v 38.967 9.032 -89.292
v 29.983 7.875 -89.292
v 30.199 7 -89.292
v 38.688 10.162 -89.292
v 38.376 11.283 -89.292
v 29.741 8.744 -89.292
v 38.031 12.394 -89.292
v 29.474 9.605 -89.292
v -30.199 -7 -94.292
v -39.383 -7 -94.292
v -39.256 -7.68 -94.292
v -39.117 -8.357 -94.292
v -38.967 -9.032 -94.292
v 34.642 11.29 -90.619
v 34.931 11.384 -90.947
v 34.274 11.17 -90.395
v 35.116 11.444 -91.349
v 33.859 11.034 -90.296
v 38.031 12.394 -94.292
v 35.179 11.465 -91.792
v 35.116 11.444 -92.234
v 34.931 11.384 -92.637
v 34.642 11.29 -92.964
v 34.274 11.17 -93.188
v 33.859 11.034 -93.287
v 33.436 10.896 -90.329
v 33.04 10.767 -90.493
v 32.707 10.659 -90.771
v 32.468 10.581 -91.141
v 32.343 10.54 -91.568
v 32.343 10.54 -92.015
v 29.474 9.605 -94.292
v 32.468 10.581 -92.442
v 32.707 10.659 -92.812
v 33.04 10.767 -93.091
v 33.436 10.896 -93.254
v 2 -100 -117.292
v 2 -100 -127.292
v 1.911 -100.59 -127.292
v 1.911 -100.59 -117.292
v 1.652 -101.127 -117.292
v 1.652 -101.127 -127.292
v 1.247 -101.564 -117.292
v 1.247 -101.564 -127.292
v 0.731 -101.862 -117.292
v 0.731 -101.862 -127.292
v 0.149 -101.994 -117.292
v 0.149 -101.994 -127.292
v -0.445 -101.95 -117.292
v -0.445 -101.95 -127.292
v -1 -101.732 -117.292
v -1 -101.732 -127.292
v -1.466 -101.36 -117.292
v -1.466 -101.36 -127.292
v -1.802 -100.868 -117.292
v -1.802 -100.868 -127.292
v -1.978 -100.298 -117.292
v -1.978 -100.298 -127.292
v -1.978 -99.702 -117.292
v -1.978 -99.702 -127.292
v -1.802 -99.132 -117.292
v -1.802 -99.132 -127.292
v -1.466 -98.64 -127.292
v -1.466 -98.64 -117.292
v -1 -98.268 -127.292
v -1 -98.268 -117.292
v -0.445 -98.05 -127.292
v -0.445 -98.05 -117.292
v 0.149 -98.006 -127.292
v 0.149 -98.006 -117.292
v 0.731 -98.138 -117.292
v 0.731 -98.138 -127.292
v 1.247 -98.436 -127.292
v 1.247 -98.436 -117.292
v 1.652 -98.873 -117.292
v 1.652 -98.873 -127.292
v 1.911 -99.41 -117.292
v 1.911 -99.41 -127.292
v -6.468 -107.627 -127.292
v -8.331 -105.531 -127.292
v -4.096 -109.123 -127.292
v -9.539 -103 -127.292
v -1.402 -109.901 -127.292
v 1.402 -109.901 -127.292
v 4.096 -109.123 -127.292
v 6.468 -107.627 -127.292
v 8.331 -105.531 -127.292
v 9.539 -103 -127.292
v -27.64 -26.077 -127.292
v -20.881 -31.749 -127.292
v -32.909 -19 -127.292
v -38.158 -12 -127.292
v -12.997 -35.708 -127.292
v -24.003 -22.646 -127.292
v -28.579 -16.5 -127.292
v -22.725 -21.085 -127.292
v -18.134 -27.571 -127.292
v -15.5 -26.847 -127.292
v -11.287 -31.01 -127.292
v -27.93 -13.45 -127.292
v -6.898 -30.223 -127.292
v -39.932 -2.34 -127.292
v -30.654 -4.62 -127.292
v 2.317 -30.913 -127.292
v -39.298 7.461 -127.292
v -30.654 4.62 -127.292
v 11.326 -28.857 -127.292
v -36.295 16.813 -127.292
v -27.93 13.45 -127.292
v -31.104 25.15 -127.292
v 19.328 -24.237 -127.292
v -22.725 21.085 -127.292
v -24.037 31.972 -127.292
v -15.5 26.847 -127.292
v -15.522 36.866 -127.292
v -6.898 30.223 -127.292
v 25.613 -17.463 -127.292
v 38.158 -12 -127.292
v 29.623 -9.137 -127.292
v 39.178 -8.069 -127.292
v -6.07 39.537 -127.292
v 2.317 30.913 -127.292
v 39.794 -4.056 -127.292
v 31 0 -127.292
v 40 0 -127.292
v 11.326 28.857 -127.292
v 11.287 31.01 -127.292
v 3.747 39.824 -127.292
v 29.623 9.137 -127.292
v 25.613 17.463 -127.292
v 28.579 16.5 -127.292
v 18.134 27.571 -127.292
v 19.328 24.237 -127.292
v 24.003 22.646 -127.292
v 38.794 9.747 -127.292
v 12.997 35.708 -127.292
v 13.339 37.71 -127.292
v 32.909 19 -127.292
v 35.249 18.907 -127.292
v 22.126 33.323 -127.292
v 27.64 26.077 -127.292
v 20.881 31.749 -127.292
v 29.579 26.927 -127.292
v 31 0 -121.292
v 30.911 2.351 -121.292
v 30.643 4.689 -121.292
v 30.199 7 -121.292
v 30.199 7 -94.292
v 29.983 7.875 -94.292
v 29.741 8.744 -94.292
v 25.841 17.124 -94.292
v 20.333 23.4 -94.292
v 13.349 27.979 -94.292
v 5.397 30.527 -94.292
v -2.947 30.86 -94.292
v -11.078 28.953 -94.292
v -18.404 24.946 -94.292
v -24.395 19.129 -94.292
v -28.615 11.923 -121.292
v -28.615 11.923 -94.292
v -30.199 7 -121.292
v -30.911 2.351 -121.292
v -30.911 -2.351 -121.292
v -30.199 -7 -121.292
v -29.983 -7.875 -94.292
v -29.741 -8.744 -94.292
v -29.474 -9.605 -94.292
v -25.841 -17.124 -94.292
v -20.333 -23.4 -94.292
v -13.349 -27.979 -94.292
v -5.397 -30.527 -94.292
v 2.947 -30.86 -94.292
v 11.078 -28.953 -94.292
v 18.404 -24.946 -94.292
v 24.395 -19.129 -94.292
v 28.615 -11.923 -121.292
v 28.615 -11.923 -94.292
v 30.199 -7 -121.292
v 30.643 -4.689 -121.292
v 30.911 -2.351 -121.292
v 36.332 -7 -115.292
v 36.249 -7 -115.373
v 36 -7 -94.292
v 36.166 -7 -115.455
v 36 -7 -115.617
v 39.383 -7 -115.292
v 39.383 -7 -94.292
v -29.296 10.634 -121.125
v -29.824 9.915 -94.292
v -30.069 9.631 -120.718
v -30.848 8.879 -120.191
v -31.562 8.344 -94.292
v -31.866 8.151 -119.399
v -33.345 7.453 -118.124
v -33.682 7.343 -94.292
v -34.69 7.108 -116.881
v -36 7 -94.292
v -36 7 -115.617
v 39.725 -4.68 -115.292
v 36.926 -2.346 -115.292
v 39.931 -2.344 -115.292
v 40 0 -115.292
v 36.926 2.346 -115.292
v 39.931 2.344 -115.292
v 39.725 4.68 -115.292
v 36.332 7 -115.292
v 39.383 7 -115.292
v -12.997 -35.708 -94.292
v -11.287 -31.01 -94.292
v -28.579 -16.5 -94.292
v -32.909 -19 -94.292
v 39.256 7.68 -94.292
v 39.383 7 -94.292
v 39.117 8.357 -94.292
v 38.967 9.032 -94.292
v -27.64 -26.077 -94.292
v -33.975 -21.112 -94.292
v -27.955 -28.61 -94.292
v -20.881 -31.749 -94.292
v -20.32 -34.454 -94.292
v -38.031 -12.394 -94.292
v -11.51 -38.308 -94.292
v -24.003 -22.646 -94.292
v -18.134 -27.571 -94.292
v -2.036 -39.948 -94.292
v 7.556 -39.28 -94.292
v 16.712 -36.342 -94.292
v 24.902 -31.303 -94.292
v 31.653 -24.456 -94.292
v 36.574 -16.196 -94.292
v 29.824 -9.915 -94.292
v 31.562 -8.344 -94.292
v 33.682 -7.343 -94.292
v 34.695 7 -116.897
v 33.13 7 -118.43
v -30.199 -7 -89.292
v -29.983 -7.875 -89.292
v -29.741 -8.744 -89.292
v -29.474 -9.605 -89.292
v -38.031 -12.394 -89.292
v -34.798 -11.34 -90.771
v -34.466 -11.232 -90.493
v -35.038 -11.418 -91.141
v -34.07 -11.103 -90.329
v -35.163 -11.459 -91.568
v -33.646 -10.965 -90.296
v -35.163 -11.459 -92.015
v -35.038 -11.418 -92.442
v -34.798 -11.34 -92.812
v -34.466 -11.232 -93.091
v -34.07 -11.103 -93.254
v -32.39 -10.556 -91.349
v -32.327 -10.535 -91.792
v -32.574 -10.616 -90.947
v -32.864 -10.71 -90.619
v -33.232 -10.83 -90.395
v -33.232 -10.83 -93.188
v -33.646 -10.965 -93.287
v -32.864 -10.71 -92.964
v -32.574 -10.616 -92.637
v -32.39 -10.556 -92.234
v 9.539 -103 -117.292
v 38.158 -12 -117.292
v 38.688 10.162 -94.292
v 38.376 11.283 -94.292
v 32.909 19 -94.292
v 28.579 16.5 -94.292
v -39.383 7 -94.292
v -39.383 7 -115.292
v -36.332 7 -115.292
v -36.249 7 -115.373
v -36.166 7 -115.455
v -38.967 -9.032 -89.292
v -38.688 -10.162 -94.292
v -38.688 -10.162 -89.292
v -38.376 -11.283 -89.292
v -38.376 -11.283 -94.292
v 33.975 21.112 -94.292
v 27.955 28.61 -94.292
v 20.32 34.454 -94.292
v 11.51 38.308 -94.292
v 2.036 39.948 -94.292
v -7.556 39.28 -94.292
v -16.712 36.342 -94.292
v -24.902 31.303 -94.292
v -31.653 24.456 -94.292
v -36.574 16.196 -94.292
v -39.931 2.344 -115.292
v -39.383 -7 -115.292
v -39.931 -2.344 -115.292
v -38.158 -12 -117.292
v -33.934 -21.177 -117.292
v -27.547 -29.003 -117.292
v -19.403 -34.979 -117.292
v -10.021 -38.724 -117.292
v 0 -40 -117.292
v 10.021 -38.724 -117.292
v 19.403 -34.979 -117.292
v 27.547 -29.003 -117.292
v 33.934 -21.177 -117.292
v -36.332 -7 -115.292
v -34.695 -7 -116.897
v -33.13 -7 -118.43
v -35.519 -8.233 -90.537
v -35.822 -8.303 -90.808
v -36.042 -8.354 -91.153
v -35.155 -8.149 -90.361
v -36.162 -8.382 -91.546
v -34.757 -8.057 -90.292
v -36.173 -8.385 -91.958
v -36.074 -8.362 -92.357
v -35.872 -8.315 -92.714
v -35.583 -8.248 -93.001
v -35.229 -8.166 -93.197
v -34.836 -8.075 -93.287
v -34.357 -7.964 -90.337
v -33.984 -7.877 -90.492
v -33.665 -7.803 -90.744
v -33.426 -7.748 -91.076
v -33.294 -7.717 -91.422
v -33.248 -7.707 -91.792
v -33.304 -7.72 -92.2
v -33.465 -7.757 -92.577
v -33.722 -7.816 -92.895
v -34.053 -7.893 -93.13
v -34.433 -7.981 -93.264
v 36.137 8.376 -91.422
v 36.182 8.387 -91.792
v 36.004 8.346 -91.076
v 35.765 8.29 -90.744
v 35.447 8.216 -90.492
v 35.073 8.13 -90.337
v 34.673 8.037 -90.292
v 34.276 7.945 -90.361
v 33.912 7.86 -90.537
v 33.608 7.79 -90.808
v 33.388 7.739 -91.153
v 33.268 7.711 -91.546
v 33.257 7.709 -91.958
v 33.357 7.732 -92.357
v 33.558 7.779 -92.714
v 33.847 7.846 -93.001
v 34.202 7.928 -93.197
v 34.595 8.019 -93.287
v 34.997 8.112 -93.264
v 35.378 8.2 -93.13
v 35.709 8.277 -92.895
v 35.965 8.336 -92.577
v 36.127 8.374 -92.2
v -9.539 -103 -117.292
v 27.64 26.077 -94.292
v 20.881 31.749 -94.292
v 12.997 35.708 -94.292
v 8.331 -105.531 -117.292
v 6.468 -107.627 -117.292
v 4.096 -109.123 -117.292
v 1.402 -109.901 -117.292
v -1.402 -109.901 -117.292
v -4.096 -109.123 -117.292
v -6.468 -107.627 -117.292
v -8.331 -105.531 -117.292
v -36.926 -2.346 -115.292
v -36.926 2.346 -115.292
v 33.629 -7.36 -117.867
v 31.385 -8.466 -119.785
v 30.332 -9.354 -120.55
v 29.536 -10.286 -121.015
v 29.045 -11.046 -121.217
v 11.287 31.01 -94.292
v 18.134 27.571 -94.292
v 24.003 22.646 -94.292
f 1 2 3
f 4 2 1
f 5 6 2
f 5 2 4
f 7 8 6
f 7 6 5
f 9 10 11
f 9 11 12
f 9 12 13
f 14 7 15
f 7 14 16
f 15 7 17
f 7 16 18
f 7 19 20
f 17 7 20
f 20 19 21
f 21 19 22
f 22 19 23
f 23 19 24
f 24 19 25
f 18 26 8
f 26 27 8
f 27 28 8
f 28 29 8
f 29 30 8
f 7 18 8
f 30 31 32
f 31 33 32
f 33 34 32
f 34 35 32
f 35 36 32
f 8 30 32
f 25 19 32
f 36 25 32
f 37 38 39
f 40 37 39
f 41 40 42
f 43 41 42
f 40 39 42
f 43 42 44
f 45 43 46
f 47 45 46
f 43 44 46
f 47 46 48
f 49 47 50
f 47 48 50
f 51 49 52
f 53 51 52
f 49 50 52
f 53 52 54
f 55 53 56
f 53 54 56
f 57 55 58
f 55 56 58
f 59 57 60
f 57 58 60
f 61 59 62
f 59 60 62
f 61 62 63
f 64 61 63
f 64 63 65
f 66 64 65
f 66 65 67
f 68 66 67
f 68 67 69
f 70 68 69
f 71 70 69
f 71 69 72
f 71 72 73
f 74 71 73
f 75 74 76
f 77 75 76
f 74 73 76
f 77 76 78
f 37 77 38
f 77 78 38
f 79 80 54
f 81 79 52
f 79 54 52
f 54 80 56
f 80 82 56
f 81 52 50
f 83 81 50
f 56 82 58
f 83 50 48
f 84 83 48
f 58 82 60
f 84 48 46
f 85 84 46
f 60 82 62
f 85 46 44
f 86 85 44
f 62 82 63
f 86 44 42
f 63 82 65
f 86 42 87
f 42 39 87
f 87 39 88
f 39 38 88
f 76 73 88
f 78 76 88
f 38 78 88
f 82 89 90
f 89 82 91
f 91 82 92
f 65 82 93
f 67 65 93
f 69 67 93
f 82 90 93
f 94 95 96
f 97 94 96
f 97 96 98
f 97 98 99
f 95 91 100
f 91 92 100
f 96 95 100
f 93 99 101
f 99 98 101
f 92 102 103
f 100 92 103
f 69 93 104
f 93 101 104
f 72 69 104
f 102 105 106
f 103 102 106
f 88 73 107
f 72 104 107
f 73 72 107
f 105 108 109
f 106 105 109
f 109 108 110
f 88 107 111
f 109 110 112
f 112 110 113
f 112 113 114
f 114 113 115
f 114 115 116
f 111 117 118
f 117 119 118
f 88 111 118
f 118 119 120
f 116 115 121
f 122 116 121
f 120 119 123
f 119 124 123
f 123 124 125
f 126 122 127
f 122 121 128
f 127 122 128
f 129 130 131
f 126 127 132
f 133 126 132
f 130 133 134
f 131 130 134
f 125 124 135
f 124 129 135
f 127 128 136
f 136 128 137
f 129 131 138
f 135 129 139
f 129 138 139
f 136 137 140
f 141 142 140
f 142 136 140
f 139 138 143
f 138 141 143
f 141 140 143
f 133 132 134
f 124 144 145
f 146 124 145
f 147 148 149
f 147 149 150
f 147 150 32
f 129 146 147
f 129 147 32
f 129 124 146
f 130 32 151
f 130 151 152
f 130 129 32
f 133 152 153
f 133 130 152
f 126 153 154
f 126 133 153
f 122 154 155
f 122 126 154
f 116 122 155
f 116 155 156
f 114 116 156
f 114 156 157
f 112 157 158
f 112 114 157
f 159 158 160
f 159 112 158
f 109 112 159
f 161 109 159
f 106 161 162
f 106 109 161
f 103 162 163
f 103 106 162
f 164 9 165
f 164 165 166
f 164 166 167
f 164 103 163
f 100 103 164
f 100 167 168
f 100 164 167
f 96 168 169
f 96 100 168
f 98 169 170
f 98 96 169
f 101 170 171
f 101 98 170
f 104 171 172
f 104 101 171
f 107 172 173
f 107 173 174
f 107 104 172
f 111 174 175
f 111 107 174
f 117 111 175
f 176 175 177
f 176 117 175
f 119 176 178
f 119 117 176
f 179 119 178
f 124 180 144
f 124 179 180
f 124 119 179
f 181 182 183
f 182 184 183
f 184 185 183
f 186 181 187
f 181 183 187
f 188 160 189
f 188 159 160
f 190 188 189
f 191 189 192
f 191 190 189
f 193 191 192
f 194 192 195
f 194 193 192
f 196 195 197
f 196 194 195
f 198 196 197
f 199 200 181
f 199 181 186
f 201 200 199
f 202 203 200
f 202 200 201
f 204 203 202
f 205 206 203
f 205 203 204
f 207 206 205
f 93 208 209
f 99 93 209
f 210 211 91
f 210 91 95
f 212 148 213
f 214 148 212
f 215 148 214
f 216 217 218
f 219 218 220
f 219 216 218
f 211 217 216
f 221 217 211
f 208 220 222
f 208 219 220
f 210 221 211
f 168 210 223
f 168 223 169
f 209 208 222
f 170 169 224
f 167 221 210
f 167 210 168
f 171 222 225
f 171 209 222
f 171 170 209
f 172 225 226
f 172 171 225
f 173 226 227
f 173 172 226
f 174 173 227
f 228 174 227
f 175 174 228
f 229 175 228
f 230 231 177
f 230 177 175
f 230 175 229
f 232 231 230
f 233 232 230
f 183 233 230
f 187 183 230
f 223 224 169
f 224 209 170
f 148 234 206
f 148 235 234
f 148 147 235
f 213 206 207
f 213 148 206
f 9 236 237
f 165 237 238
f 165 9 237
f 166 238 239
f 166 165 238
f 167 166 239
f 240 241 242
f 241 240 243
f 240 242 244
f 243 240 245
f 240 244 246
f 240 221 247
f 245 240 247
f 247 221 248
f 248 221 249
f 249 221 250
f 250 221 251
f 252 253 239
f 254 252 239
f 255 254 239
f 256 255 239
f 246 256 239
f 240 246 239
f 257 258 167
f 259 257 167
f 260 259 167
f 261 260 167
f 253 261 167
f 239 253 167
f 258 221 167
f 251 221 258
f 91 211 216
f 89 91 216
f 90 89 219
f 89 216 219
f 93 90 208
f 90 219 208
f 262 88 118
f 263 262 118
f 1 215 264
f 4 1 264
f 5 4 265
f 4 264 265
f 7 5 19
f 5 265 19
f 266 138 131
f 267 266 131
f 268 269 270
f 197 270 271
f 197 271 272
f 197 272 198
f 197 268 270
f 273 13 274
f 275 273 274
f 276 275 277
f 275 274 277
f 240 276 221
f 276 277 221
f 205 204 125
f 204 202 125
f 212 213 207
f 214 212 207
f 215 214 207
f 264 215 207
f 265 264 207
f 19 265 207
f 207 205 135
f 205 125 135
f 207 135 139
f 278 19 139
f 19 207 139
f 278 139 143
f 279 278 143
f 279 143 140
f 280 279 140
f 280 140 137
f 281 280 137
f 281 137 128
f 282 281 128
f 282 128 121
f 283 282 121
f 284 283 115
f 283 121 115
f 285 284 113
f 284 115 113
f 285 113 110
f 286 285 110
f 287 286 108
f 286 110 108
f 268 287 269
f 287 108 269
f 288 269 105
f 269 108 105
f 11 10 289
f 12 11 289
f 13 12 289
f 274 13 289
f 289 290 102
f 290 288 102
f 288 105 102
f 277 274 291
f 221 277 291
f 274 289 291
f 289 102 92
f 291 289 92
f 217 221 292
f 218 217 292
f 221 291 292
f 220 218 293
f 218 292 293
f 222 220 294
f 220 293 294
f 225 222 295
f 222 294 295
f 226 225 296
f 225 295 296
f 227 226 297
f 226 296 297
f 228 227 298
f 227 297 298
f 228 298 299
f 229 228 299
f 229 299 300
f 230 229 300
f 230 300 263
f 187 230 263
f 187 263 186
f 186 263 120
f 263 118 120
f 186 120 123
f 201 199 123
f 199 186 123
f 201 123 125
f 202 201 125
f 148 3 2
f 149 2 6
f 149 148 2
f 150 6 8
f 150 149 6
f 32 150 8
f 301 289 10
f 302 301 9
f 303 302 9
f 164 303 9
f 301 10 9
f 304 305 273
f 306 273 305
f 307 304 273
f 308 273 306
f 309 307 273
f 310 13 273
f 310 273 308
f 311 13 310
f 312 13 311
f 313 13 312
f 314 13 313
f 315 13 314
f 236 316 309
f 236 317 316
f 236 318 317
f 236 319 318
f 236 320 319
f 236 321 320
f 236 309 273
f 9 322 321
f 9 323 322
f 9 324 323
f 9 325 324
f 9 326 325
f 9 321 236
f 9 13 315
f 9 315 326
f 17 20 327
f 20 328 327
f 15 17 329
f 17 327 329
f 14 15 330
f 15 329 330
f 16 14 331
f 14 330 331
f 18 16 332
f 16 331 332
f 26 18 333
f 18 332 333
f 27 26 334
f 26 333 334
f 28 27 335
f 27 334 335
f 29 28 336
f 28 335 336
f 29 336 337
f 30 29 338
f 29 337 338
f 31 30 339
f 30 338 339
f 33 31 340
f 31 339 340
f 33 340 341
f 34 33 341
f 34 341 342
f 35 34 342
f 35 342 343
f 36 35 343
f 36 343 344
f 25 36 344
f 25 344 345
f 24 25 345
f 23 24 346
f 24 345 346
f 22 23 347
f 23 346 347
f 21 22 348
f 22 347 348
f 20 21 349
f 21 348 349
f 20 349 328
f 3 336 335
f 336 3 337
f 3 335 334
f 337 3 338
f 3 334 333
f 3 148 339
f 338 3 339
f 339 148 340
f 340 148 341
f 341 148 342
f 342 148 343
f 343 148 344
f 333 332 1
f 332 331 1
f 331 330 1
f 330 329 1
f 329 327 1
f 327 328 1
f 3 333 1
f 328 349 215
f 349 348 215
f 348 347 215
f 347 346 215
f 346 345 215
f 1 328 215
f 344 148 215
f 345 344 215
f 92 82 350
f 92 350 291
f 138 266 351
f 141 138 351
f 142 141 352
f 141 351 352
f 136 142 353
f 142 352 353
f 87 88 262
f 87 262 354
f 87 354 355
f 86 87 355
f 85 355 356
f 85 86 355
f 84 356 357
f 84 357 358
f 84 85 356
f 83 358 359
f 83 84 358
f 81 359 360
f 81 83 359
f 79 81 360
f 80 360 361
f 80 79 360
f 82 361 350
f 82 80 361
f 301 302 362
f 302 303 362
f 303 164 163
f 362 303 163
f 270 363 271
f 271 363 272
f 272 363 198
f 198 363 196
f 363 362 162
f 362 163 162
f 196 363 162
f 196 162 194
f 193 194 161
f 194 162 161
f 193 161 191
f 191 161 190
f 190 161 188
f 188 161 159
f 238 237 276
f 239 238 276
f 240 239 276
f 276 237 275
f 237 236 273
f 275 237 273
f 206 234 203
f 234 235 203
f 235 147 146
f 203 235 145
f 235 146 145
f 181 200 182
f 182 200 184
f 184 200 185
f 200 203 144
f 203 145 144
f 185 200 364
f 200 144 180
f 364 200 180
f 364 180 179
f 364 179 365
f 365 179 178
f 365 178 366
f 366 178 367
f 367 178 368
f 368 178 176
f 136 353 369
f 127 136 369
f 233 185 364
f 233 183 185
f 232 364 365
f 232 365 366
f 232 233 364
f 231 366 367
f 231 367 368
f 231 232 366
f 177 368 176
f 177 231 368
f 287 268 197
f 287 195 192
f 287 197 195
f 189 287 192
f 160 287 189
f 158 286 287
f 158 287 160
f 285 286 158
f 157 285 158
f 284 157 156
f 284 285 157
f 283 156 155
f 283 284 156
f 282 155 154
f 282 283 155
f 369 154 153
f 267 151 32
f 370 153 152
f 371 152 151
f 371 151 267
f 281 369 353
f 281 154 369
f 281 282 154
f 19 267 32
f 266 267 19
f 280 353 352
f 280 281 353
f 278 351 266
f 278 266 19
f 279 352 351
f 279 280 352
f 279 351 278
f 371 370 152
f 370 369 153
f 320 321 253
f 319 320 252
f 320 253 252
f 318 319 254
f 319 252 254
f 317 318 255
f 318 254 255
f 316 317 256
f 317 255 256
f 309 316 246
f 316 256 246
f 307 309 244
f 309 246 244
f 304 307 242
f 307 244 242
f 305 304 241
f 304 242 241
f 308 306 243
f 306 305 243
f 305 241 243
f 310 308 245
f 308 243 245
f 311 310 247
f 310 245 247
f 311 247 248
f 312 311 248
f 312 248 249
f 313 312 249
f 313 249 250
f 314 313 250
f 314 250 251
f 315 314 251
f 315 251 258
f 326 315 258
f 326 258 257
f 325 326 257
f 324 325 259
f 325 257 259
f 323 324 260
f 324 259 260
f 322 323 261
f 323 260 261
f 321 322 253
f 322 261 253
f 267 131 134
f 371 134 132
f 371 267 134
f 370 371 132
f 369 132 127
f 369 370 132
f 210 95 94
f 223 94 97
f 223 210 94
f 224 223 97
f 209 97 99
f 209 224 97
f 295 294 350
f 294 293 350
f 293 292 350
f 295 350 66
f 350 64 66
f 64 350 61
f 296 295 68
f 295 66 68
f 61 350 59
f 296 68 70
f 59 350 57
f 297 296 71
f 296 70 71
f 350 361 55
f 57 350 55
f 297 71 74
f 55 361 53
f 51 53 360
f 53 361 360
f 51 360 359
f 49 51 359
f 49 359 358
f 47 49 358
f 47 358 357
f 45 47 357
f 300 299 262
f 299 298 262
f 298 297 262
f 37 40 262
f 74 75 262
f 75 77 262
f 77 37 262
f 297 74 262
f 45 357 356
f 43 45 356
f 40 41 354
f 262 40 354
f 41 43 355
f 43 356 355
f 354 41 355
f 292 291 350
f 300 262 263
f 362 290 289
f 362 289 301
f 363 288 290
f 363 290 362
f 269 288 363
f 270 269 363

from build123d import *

# Parameters (mm, degrees)
SKETCH022_R        = 40
SKETCH022_R_2      = 31
PAD006_DEPTH       = 33
SKETCH023_W        = 90
SKETCH023_H        = 14
POCKET010_DEPTH    = 21
CHAMFER_SIZE       = 6
POCKET011_DEPTH    = 268.7042032027
POLARPATTERN_COUNT = 2
FILLET001_R        = 8
PAD008_DEPTH       = 5
SKETCH028_R        = 1.5
POCKET013_DEPTH    = 3.5
SKETCH029_R        = 2
PAD009_DEPTH       = 10


with BuildPart() as part:
    # Sketch022 (on DatumPlane) → Pad006 (new body)
    with BuildSketch(Plane.XY.offset(-127.29162)):
        Circle(SKETCH022_R)
        Circle(SKETCH022_R_2, mode=Mode.SUBTRACT)
    extrude(amount=PAD006_DEPTH)

    # Sketch023 (on Face4 of Pad006) → Pocket010 (cut)
    with BuildSketch(Plane.XY.offset(-94.29162)):
        Rectangle(SKETCH023_W, SKETCH023_H)
    extrude(amount=-POCKET010_DEPTH, mode=Mode.SUBTRACT)

    # Chamfer
    chamfer_edges = [part.edges().sort_by_distance(p)[0] for p in [
        (-31, 0, -115.29162),
        (30.799184, -3.522821, -115.29162),
    ]]
    chamfer(chamfer_edges, length=CHAMFER_SIZE)

    # Sketch024 (on Face8 of Chamfer) → Pocket011 (cut, through all)
    with BuildSketch(Plane.XY.offset(-94.29162)):
        with BuildLine():
            ThreePointArc((-32.9089653438, -19), (-24.4259291681, -29.1096888385), (-12.9967654464, -35.7083195899))
            Line((-12.9967654464, -35.7083195899), (-11.2866647297, -31.0098564859))
            ThreePointArc((-28.5788383249, -16.5), (-21.2119911197, -25.2794666229), (-11.2866647297, -31.0098564859))
            Line((-32.9089653438, -19), (-28.5788383249, -16.5))
        make_face()
    pocket011 = extrude(amount=-POCKET011_DEPTH, mode=Mode.SUBTRACT)

    # PolarPattern: Pocket011 ×2 about axis
    polarpattern_axis = Axis((0, 0, -94.29162), (0, 0, 1))
    for i in range(1, POLARPATTERN_COUNT):
        add(pocket011.rotate(polarpattern_axis, i * 360 / POLARPATTERN_COUNT), mode=Mode.SUBTRACT)

    # Fillet001
    fillet001_edges = [part.edges().sort_by_distance(p)[0] for p in [
        (-30.199338, 7, -104.79162),
        (30.199338, -7, -104.79162),
    ]]
    fillet(fillet001_edges, radius=FILLET001_R)

    # Sketch027 (on Face7 of Fillet001) → Pad008 (join)
    with BuildSketch(Plane.XY.offset(-94.29162)):
        with BuildLine():
            ThreePointArc((-30.1993377411, -7), (-29.8652589516, -8.3106141622), (-29.4743299443, -9.6054085979))
            Line((-38.0313934765, -12.3940756103), (-29.4743299443, -9.605408598))
            ThreePointArc((-38.9668874079, -9.0322580645), (-38.5358180021, -10.7233731125), (-38.0313934765, -12.3940756103))
            Line((-38.9668874078, -9.0322580645), (-30.1993377411, -7))
        make_face()
        with BuildLine():
            Line((30.1993377411, 7), (38.9668874078, 9.0322580645))
            ThreePointArc((38.9668874078, 9.0322580645), (38.5358180021, 10.7233731125), (38.0313934765, 12.3940756102))
            Line((38.0313934765, 12.3940756103), (29.4743299443, 9.605408598))
            ThreePointArc((30.1993377411, 7), (29.8652589516, 8.3106141622), (29.4743299443, 9.6054085979))
        make_face()
    extrude(amount=PAD008_DEPTH)

    # Sketch028 (on Face20 of Pad008) → Pocket013 (cut, symmetric)
    with BuildSketch(Plane(origin=(0, 0, -127.29162), x_dir=(0.9507848369, 0.3098518903, 0), z_dir=(0.3098518903, -0.9507848369, 0))):
        with Locations((-35.5, 35.5)):
            Circle(SKETCH028_R)
        with Locations((35.5, 35.5)):
            Circle(SKETCH028_R)
    extrude(amount=POCKET013_DEPTH, both=True, mode=Mode.SUBTRACT)

    # Sketch029 (on Face19 of Pocket013) → Pad009 (join)
    with BuildSketch(Plane(origin=(0, 0, -127.29162), x_dir=(1, 0, 0), z_dir=(0, 0, -1))):
        with BuildLine():
            ThreePointArc((9.5394034408, 102.9999636655), (3e-10, 110), (-9.5394034406, 102.9999636661))
            Line((-9.5394034406, 102.9999636661), (-38.1575696347, 11.9999949821))
            ThreePointArc((38.1575696236, 11.9999950176), (-1.86e-08, 40), (-38.1575696347, 11.9999949821))
            Line((9.5394034408, 102.9999636656), (38.1575696236, 11.9999950176))
        make_face()
        with Locations((0, 100)):
            Circle(SKETCH029_R, mode=Mode.SUBTRACT)
    extrude(amount=-PAD009_DEPTH)


solid = part.part
